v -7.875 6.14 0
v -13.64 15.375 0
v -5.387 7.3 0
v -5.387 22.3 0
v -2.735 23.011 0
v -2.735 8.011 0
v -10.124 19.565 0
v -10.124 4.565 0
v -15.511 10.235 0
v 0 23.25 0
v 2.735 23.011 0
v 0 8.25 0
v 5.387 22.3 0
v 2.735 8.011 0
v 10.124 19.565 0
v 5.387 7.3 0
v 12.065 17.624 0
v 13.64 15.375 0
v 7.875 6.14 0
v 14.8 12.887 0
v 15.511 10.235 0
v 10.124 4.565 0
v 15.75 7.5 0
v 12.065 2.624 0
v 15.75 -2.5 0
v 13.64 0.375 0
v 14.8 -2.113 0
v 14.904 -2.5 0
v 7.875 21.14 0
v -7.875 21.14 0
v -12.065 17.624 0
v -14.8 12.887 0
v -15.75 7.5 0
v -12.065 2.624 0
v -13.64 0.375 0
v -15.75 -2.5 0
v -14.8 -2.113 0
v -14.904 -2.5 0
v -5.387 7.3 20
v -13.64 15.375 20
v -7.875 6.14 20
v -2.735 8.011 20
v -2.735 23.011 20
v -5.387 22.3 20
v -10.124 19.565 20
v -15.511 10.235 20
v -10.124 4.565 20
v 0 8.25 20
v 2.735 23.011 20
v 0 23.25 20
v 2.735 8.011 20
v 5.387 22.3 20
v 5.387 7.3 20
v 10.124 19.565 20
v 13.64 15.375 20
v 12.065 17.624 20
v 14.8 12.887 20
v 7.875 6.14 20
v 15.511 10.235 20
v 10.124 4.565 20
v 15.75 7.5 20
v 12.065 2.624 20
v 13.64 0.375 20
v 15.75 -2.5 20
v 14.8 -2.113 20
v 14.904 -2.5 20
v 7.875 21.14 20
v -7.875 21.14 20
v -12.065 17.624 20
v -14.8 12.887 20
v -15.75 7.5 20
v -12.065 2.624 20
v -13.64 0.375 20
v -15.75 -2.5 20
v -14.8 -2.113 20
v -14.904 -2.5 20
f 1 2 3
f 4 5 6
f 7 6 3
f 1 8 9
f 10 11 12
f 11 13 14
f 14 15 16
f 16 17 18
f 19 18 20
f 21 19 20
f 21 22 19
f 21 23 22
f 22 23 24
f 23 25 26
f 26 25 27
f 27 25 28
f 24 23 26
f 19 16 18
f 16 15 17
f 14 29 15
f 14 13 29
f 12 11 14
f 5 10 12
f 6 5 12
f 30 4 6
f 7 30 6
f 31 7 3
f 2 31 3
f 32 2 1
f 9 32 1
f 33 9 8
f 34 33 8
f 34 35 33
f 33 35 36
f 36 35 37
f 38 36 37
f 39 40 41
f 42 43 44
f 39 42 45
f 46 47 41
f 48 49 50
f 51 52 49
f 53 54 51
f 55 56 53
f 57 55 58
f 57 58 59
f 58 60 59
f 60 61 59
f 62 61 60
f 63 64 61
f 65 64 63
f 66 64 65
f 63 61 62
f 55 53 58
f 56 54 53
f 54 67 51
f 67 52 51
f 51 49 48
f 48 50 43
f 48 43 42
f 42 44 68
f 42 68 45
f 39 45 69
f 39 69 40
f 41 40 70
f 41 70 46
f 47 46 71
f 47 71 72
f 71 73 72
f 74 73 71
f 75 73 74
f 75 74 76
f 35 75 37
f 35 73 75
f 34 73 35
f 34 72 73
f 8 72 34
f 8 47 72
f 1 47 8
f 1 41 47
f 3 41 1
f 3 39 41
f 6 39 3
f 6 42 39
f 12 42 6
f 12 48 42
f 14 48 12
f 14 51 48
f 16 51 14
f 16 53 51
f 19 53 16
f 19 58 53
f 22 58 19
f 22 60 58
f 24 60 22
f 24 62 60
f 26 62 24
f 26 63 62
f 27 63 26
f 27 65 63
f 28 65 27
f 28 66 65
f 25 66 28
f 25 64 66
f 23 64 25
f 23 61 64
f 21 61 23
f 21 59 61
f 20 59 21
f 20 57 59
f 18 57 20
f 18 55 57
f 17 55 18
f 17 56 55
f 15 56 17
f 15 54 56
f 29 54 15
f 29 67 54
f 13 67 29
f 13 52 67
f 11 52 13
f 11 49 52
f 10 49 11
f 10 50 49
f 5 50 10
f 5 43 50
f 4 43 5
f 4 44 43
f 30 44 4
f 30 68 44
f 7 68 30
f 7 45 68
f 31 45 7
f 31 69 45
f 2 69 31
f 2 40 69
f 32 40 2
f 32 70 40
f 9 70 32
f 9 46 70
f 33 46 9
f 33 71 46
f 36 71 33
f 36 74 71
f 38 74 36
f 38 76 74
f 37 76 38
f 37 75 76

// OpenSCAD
bar_diameter=31.5; //mm
height=15; //mm
width=20; //mm
$fn=36;

linear_extrude(width) {
  difference() {
    union() {
      square([bar_diameter, height], true);
      translate([0, height / 2]) {
        circle(d=bar_diameter);
      }
    }
    translate([0, height / -2]) {
      circle(d=bar_diameter);
    }
    translate([0, height / -1.5]) {
      square([bar_diameter, height], true);
    }
  }
}
